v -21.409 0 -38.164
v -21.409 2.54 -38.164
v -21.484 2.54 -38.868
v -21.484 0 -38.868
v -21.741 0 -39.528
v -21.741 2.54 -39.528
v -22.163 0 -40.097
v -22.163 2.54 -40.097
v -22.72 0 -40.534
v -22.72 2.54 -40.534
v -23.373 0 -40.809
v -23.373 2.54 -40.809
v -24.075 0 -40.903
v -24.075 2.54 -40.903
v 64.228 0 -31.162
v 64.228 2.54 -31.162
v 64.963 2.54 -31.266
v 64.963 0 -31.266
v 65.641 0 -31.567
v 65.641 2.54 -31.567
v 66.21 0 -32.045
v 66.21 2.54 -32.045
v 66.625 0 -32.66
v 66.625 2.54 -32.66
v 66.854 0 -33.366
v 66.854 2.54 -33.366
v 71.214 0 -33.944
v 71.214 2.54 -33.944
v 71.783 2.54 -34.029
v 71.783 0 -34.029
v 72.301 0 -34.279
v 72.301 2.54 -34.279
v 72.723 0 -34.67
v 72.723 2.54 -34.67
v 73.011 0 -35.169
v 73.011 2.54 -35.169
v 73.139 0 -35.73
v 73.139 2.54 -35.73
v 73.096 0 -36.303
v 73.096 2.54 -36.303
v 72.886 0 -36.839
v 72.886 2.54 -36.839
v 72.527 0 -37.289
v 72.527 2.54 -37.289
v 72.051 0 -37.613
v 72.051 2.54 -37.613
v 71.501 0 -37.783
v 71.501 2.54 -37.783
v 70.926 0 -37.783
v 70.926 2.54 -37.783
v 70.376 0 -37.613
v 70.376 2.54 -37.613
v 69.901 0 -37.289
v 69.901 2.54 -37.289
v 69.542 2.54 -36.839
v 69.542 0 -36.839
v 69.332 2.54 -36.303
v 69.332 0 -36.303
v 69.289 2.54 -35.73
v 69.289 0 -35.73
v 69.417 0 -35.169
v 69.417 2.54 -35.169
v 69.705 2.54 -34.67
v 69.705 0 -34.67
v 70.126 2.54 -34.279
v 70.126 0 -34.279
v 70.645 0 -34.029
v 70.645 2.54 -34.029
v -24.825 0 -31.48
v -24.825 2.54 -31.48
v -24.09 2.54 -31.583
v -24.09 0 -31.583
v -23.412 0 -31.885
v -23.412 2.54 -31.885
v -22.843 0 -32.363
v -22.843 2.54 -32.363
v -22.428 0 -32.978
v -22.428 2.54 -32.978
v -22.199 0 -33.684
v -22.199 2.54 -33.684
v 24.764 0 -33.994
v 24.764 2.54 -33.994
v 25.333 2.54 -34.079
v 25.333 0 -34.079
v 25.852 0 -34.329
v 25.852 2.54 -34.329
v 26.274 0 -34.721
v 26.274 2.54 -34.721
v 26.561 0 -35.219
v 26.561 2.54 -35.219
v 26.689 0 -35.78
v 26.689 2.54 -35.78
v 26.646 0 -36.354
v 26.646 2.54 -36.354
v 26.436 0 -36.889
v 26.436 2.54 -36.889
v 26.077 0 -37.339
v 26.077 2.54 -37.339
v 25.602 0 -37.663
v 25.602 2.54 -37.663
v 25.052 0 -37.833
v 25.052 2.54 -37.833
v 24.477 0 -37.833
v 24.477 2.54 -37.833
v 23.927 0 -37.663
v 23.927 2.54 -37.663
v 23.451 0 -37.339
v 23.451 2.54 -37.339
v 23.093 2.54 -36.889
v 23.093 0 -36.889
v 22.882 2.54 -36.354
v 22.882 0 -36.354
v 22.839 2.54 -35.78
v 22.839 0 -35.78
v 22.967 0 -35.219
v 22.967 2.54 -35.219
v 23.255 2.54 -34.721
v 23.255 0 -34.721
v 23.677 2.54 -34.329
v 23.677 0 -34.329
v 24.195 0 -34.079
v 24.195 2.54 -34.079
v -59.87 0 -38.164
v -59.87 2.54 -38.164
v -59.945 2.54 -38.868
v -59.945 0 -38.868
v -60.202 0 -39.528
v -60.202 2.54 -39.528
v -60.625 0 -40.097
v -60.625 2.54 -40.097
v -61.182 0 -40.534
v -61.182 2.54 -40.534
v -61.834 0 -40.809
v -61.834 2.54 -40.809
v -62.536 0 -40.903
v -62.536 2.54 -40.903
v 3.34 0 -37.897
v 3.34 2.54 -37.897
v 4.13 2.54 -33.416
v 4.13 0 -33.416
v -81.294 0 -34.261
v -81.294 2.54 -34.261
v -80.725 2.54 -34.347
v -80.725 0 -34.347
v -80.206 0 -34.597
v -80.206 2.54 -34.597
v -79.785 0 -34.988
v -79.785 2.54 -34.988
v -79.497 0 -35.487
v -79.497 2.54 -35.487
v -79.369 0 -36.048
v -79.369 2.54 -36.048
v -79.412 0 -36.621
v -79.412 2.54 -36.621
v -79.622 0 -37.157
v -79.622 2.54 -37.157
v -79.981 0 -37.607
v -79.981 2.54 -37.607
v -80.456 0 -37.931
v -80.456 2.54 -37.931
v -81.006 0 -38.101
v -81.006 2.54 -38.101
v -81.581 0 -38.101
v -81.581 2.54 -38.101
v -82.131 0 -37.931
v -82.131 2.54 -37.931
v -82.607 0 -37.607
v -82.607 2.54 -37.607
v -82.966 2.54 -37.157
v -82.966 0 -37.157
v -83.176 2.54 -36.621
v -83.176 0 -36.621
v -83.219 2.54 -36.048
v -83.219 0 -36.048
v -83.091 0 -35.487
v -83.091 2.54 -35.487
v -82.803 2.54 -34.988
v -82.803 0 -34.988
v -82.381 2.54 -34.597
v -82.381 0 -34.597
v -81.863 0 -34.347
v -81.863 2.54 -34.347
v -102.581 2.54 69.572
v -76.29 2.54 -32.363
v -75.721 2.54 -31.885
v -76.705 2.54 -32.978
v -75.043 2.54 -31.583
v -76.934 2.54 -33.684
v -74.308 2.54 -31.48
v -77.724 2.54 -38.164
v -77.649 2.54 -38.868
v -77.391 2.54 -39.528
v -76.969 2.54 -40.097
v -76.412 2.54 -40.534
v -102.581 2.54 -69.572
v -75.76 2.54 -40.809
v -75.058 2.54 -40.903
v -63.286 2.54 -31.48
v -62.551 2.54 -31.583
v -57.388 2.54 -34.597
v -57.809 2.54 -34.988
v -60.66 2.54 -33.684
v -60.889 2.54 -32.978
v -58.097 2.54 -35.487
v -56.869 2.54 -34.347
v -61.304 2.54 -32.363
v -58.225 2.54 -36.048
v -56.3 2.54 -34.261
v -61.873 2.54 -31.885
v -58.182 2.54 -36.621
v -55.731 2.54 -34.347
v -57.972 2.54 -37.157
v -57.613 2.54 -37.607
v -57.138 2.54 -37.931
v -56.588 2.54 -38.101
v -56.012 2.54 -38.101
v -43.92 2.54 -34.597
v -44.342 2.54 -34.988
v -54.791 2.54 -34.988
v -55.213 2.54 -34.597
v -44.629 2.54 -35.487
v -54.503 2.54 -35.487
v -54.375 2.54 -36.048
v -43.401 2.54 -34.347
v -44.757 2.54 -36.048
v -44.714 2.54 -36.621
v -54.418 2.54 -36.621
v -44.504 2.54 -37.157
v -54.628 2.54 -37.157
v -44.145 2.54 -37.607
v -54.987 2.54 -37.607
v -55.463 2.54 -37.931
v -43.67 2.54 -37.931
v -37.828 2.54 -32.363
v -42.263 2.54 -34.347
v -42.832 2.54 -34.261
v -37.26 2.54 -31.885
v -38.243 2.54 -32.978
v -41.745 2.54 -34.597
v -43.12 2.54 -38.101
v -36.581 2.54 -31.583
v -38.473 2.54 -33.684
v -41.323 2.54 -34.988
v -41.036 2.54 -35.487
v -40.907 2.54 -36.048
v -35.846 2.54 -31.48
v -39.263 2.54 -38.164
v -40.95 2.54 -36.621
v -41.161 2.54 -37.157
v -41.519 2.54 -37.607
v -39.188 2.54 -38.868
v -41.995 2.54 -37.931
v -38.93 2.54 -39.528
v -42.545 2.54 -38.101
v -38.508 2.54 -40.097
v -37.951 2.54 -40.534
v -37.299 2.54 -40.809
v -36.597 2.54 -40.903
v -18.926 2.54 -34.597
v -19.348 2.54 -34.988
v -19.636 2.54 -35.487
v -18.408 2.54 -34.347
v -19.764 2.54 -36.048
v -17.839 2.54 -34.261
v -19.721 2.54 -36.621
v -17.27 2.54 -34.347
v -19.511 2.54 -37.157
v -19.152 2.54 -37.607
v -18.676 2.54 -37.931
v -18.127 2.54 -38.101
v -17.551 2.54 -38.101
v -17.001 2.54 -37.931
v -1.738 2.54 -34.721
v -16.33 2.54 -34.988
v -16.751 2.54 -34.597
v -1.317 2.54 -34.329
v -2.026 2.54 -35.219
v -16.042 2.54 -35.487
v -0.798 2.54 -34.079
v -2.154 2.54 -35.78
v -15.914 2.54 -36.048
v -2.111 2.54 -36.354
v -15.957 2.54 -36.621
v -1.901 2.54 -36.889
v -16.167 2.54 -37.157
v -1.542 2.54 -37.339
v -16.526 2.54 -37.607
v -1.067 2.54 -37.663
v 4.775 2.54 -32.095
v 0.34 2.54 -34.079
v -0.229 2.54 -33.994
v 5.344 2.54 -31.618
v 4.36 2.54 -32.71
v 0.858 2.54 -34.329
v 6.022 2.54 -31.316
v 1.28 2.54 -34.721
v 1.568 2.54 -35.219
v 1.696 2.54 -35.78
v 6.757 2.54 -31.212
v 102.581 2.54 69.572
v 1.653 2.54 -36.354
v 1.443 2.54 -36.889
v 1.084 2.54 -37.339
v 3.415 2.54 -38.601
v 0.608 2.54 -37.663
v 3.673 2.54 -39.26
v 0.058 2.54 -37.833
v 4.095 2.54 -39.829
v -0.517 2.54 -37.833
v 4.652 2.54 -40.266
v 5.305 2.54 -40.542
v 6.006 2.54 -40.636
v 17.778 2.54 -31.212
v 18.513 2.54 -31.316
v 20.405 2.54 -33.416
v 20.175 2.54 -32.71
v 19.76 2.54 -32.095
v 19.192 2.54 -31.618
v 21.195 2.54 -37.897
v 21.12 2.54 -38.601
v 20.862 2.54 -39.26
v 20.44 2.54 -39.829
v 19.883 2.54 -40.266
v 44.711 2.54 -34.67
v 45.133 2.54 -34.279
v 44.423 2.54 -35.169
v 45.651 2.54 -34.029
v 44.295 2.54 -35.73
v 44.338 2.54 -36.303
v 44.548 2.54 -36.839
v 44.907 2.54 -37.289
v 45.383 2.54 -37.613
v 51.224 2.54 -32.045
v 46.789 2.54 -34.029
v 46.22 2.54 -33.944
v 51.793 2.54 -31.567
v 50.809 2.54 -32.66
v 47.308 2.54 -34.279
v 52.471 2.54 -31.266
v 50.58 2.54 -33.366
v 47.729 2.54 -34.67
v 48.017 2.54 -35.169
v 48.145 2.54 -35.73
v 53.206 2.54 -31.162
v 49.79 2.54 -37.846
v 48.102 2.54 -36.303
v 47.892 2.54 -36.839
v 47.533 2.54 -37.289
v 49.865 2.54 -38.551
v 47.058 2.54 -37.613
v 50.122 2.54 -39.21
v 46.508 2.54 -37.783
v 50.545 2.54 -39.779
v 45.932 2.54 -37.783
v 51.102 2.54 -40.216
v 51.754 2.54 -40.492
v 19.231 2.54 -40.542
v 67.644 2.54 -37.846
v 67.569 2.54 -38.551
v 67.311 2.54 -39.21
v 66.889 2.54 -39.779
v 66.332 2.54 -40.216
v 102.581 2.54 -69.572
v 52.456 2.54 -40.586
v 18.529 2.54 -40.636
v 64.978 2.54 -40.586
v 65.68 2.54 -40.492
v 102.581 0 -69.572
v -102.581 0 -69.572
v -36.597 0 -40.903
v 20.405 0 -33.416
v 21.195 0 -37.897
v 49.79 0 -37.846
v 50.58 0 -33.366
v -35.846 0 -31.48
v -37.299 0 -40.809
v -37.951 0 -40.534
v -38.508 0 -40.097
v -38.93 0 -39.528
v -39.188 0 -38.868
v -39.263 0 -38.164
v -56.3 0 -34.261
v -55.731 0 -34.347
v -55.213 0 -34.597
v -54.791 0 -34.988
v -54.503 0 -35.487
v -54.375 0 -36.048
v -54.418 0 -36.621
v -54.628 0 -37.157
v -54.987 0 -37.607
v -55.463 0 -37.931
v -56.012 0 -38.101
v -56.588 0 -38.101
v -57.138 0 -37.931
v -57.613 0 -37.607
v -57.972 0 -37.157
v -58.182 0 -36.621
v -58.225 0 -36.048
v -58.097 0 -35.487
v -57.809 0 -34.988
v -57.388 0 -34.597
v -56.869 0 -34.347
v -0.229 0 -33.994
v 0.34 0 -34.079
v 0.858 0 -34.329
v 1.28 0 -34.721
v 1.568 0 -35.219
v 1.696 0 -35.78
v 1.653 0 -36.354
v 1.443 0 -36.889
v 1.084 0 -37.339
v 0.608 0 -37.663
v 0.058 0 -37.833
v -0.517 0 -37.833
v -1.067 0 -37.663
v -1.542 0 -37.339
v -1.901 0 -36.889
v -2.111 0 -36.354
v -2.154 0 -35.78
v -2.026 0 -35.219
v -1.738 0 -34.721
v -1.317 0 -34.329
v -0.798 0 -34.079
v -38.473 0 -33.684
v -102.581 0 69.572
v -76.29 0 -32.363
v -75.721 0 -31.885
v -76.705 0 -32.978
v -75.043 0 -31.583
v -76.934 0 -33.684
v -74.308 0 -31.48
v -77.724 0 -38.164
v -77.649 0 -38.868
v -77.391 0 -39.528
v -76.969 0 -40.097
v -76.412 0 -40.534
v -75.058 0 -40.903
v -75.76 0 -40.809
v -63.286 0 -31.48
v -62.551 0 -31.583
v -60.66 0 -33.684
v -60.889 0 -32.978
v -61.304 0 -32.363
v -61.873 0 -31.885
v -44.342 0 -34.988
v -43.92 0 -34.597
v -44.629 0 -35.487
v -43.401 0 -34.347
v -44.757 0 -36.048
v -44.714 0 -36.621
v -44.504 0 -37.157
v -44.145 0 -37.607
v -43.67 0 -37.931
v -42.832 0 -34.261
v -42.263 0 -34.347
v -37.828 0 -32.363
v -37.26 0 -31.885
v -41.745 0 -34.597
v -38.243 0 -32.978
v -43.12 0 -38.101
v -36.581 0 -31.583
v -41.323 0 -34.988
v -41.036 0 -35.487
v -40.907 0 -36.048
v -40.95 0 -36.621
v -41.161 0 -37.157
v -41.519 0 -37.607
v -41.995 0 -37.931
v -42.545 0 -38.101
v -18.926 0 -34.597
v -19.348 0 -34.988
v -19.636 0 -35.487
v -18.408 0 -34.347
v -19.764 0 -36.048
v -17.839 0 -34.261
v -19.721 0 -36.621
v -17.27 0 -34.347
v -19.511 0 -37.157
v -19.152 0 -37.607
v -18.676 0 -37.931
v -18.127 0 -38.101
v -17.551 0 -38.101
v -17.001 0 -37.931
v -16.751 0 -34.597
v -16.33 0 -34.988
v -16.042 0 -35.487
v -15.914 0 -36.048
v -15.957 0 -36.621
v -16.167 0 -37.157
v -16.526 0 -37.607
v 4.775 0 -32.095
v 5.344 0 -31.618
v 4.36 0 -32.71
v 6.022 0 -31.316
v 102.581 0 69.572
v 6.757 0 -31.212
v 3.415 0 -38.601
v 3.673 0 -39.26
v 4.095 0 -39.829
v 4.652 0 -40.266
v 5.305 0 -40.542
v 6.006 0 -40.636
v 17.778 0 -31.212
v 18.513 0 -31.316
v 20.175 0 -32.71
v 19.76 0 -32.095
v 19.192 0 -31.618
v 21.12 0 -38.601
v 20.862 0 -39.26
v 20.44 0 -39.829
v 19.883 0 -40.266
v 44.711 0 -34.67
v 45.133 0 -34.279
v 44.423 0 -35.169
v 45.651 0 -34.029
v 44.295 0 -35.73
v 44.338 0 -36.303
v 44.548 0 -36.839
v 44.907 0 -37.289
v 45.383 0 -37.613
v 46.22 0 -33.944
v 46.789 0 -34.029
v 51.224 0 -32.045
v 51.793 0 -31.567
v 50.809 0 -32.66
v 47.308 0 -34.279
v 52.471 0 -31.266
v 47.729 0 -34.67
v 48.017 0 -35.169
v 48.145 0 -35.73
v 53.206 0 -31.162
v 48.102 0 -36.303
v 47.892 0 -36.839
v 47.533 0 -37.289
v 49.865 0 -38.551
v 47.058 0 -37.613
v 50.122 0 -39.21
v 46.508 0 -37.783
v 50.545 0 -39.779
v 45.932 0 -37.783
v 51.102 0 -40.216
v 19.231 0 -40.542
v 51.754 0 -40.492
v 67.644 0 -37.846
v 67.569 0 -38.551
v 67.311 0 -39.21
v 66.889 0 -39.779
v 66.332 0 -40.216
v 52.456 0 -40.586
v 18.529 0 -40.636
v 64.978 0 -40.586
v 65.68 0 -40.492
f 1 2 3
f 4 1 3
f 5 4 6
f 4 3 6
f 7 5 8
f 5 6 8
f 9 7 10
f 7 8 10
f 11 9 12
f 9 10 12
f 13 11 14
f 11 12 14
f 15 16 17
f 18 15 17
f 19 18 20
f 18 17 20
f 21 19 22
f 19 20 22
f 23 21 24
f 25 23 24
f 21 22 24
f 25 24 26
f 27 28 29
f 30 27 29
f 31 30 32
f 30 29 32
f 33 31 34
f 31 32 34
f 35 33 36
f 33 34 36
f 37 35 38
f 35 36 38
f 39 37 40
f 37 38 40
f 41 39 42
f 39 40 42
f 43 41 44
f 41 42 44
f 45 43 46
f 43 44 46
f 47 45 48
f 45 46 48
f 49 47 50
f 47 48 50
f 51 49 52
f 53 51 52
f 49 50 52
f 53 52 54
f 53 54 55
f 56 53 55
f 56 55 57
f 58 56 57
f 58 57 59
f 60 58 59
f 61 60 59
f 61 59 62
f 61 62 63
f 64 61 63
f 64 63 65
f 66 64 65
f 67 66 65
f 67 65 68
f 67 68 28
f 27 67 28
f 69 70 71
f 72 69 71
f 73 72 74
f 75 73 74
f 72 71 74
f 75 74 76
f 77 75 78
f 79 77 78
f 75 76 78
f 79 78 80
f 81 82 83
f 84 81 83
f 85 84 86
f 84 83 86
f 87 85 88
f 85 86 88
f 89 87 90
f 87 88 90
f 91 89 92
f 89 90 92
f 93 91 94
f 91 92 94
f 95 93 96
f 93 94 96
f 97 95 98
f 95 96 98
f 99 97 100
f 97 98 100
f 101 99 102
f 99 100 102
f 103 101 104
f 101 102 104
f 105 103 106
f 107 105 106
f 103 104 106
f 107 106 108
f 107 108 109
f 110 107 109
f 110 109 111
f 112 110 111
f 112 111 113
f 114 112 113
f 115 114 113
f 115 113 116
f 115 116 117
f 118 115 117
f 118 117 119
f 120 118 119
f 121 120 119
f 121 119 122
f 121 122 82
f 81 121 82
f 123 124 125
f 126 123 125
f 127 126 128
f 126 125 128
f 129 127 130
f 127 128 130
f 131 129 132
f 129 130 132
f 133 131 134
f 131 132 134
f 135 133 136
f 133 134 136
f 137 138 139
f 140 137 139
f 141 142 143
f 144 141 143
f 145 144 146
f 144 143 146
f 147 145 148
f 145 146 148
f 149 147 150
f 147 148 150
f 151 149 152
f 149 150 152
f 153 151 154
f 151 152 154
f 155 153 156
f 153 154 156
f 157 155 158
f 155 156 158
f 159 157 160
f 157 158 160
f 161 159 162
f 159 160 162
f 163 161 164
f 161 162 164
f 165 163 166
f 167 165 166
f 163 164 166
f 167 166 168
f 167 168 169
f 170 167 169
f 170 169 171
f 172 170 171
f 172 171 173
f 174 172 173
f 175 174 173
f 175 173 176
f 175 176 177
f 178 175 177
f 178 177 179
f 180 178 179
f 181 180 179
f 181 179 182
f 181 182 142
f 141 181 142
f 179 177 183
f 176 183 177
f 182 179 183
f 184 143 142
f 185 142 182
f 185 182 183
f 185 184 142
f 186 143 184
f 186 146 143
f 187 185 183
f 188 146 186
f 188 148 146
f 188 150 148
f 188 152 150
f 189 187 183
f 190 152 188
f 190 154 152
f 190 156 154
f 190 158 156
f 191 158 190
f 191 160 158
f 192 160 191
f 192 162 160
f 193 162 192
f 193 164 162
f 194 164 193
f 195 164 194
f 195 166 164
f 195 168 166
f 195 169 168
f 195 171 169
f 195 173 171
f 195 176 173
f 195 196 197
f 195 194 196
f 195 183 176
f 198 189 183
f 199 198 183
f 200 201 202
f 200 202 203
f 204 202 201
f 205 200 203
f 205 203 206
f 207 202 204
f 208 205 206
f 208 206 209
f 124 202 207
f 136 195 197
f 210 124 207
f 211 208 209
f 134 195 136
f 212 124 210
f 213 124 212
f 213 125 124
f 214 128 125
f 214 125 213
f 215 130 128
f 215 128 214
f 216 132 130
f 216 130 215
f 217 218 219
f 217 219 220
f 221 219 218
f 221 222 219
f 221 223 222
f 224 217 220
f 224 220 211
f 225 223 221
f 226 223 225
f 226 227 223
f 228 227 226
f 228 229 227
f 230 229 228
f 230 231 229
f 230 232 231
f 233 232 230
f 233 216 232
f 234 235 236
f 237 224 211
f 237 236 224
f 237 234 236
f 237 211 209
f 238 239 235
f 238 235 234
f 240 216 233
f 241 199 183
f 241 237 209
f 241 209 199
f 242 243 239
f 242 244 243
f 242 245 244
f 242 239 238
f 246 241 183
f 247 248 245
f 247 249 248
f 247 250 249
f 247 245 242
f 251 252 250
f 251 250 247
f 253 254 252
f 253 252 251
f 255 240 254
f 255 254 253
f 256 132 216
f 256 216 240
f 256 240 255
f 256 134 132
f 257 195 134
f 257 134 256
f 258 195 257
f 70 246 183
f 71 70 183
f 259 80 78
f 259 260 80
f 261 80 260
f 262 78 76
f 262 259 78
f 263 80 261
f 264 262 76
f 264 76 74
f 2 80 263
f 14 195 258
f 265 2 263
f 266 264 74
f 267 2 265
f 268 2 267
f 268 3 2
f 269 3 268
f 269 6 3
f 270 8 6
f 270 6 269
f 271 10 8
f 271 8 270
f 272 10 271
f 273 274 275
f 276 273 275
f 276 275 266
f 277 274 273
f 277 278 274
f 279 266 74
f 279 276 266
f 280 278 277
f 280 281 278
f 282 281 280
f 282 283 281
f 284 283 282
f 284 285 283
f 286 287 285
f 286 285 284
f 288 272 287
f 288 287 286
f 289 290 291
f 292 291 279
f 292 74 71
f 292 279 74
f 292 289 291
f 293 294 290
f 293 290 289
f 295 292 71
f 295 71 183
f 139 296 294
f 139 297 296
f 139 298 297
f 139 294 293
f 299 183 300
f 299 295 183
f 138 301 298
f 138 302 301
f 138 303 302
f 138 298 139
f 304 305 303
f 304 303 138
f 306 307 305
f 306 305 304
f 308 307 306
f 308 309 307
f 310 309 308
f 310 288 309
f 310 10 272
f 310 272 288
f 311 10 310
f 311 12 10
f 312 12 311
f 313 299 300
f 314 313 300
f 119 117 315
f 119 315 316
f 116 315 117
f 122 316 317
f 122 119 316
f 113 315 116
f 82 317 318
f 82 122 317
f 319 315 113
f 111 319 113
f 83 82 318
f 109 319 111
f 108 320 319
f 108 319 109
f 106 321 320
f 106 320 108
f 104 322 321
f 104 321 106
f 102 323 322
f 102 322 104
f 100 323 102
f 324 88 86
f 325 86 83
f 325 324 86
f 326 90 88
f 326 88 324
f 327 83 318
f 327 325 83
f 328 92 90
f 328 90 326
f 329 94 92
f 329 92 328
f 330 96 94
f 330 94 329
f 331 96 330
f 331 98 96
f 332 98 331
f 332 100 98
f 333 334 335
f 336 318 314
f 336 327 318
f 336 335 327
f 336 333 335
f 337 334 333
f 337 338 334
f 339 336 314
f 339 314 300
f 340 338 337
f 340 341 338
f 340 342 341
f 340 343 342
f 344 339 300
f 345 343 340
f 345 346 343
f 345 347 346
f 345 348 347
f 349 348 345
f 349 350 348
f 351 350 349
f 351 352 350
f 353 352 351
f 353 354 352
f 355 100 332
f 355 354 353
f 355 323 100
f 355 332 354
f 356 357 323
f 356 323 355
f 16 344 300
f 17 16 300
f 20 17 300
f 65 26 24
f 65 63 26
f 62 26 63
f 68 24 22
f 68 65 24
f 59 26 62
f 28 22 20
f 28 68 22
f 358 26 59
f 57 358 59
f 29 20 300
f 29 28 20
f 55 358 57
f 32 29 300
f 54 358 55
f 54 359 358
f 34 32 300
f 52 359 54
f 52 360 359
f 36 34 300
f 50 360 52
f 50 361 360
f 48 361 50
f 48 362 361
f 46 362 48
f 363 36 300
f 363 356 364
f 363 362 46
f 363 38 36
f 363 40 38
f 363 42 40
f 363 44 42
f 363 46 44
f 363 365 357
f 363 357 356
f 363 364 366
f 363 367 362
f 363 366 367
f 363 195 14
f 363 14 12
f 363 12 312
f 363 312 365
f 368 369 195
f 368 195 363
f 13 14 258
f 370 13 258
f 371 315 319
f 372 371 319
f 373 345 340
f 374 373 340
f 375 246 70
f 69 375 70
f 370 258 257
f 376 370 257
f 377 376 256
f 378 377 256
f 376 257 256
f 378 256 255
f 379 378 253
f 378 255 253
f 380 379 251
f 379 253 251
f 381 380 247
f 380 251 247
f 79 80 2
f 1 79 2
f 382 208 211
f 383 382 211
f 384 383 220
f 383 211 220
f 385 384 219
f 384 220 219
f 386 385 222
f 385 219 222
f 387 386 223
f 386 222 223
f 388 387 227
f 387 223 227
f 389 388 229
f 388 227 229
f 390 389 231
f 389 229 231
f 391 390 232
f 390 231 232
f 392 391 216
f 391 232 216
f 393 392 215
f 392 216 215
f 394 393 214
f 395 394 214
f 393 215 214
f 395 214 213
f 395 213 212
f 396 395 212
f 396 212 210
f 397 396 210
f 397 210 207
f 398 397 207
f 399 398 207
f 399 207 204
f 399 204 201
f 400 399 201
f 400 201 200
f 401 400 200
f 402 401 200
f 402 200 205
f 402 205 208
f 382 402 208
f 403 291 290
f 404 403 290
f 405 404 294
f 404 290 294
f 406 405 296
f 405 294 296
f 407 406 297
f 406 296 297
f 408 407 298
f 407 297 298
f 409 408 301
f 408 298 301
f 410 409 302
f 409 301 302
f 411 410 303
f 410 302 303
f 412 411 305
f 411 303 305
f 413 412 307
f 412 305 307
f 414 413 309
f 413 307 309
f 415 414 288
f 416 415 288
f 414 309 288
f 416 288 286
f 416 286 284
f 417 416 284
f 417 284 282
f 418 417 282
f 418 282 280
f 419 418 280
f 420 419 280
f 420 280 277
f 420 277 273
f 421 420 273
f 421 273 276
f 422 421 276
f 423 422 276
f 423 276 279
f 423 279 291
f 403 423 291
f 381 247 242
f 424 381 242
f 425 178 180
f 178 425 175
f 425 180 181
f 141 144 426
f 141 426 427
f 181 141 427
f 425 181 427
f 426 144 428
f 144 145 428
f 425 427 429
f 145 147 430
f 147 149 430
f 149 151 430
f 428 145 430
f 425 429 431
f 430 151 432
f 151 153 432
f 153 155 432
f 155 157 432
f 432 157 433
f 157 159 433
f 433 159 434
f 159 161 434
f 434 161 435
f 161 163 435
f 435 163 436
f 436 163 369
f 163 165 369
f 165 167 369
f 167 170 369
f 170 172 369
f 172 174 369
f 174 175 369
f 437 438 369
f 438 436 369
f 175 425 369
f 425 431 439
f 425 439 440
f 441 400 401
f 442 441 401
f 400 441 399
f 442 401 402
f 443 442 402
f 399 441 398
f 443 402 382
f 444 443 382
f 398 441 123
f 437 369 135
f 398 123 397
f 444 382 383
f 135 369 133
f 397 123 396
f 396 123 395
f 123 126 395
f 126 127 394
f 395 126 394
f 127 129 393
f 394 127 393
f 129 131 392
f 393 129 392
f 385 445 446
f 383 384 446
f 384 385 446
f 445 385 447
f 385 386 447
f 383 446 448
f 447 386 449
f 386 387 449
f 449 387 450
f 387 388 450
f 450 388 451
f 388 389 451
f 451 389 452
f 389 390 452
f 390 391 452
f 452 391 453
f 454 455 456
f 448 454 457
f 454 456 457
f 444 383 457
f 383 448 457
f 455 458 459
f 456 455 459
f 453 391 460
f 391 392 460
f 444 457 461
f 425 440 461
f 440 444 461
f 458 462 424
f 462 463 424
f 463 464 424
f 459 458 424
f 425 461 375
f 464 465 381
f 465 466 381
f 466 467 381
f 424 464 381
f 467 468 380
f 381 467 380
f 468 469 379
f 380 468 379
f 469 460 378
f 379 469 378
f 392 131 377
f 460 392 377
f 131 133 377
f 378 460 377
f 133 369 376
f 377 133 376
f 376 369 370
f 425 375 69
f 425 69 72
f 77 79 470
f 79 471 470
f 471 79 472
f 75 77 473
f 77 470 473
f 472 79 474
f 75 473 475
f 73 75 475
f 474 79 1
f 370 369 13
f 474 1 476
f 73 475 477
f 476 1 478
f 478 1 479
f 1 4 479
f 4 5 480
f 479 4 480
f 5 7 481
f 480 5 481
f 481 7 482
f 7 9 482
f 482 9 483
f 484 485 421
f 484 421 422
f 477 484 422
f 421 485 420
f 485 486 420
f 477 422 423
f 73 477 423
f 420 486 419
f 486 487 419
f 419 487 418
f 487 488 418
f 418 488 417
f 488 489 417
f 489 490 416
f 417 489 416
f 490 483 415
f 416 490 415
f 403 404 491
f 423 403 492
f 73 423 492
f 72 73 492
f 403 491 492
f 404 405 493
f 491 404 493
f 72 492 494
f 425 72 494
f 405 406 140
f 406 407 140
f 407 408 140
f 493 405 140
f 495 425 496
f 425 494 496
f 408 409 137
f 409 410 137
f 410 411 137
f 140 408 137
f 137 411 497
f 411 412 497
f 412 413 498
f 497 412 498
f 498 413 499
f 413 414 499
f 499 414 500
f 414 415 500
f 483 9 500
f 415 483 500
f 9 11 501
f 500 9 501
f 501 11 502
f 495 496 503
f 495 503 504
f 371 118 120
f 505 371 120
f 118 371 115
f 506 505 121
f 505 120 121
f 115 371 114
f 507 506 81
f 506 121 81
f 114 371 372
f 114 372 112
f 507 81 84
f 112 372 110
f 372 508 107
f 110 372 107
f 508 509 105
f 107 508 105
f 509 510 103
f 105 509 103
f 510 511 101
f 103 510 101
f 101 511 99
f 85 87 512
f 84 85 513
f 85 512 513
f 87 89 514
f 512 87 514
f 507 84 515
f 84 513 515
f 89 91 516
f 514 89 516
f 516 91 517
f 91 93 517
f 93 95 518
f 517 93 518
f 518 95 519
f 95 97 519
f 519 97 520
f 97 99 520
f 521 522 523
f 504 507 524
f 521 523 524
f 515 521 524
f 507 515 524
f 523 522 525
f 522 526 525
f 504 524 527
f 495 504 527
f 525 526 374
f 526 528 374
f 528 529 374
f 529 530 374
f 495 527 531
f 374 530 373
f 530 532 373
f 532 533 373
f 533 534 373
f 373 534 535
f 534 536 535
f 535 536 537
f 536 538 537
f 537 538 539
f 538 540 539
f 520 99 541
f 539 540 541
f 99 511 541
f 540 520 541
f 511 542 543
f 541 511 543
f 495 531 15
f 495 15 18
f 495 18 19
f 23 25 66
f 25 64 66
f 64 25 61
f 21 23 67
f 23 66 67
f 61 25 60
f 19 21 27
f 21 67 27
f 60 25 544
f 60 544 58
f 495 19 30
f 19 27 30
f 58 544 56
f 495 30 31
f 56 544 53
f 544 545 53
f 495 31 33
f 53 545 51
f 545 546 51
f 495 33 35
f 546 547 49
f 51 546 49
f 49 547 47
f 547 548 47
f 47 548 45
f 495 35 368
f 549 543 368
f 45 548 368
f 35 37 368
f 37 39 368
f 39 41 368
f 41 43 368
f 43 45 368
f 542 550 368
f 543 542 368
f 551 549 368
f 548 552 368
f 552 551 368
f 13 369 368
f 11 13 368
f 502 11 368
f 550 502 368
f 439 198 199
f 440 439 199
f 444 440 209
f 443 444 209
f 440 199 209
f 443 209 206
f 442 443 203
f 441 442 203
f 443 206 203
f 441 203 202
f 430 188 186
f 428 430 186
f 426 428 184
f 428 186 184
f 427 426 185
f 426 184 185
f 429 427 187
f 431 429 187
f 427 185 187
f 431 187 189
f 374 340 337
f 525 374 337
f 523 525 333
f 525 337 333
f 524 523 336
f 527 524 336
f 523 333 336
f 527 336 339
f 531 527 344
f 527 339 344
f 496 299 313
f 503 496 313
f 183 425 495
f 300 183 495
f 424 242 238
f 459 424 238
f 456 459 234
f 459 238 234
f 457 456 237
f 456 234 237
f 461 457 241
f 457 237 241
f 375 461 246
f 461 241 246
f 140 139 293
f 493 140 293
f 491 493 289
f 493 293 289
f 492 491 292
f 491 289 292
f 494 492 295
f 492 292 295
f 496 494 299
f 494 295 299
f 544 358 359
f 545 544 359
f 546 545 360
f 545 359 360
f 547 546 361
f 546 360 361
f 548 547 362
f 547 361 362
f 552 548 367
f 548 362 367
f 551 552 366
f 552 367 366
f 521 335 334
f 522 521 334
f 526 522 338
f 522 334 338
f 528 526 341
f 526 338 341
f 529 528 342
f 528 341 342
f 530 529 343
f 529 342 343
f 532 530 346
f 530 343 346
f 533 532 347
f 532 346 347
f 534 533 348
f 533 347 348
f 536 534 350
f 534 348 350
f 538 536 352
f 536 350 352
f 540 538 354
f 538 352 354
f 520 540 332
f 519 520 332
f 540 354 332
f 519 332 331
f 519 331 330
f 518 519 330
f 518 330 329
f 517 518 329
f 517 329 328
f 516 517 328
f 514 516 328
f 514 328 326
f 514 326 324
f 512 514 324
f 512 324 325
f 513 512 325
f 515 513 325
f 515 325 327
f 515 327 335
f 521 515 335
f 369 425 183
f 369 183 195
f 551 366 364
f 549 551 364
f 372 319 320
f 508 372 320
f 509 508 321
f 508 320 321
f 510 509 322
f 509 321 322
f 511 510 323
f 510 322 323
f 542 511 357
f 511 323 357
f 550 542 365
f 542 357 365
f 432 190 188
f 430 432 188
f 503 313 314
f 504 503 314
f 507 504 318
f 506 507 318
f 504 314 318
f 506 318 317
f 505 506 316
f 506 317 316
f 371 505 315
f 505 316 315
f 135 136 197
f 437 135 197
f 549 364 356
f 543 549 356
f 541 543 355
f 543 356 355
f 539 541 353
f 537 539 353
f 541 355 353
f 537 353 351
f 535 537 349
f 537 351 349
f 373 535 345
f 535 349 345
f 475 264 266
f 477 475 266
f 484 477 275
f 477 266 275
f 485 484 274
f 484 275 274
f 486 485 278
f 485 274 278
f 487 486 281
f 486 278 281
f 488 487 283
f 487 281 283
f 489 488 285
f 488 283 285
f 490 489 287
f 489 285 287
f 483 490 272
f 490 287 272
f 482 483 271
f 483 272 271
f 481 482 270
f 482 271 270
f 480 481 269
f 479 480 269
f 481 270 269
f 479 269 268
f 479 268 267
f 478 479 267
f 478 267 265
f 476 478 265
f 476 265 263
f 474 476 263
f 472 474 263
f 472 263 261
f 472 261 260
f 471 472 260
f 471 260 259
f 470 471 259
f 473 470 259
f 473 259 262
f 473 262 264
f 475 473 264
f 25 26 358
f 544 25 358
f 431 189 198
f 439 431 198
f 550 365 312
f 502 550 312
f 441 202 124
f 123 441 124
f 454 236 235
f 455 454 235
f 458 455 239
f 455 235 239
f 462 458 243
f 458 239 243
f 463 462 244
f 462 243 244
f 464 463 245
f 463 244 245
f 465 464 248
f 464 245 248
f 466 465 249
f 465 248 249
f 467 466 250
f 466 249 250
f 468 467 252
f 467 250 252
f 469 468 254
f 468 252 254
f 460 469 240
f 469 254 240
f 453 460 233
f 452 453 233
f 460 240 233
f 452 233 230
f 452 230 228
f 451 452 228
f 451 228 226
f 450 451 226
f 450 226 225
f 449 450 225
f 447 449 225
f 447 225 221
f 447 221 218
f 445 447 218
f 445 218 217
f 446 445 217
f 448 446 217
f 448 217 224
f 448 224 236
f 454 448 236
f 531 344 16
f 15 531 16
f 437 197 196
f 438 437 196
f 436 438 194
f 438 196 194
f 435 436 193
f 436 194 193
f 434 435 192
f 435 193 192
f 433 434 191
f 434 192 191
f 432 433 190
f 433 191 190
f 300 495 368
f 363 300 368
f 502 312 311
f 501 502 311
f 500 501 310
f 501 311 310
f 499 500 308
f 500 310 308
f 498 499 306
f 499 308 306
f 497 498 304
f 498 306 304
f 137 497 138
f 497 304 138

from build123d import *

# Parameters (mm, degrees)
SKETCH1_W           = 205.16159644
SKETCH1_H           = 139.144251052
BOSS_EXTRUDE1_DEPTH = 2.54
SKETCH3_R           = 1.9304
CUT_EXTRUDE1_DEPTH  = 124.973998942


with BuildPart() as part:
    # Sketch1 → Boss-Extrude1 (new body)
    with BuildSketch(Plane(origin=(0, 0, 0), x_dir=(1, 0, 0), z_dir=(0, 1, 0))):
        Rectangle(SKETCH1_W, SKETCH1_H)
    extrude(amount=BOSS_EXTRUDE1_DEPTH)

    # Sketch3 → Cut-Extrude1 (cut, through all)
    with BuildSketch(Plane(origin=(0, 2.54, 0), x_dir=(1, 0, 0), z_dir=(0, 1, 0))):
        with Locations(Location((-81.293768085, 36.19177457, 0), (0, 0, 270))):
            Circle(SKETCH3_R)
        with Locations(Location((-56.300168085, 36.19177457, 0), (0, 0, 270))):
            Circle(SKETCH3_R)
        with Locations(Location((-42.832492591, 36.19177457, 0), (0, 0, 270))):
            Circle(SKETCH3_R)
        with Locations(Location((-17.838892591, 36.19177457, 0), (0, 0, 270))):
            Circle(SKETCH3_R)
        with Locations(Location((-0.229233582, 35.924108913, 0), (0, 0, 270))):
            Circle(SKETCH3_R)
        with Locations(Location((24.764366418, 35.924108913, 0), (0, 0, 270))):
            Circle(SKETCH3_R)
        with Locations(Location((46.220152976, 35.873923159, 0), (0, 0, 270))):
            Circle(SKETCH3_R)
        with Locations(Location((71.213752976, 35.873923159, 0), (0, 0, 270))):
            Circle(SKETCH3_R)
        with BuildLine():
            Line((-62.535868085, 40.90347457), (-75.058068085, 40.90347457))
            ThreePointArc((-75.058068085, 40.90347457), (-76.969282019, 40.096622494), (-77.724090306, 38.164262946))
            Line((-77.724090306, 38.164262946), (-76.934091112, 33.68395488))
            ThreePointArc((-76.934091112, 33.68395488), (-76.02192339, 32.10403404), (-74.307608835, 31.48007457))
            Line((-74.307608835, 31.48007457), (-63.286327336, 31.48007457))
            ThreePointArc((-63.286327336, 31.48007457), (-61.572012781, 32.10403404), (-60.659845059, 33.68395488))
            Line((-60.659845059, 33.68395488), (-59.869845865, 38.164262946))
            ThreePointArc((-59.869845865, 38.164262946), (-60.624654152, 40.096622494), (-62.535868085, 40.90347457))
        make_face()
        with BuildLine():
            Line((-24.074592591, 40.90347457), (-36.596792591, 40.90347457))
            ThreePointArc((-36.596792591, 40.90347457), (-38.508006525, 40.096622494), (-39.262814812, 38.164262946))
            Line((-39.262814812, 38.164262946), (-38.472815618, 33.68395488))
            ThreePointArc((-38.472815618, 33.68395488), (-37.560647896, 32.10403404), (-35.846333341, 31.48007457))
            Line((-35.846333341, 31.48007457), (-24.825051842, 31.48007457))
            ThreePointArc((-24.825051842, 31.48007457), (-23.110737287, 32.10403404), (-22.198569565, 33.68395488))
            Line((-22.198569565, 33.68395488), (-21.408570371, 38.164262946))
            ThreePointArc((-21.408570371, 38.164262946), (-22.163378658, 40.096622494), (-24.074592591, 40.90347457))
        make_face()
        with BuildLine():
            Line((18.528666418, 40.635808913), (6.006466418, 40.635808913))
            ThreePointArc((6.006466418, 40.635808913), (4.095252484, 39.828956838), (3.340444197, 37.89659729))
            Line((3.340444197, 37.89659729), (4.130443391, 33.416289223))
            ThreePointArc((4.130443391, 33.416289223), (5.042611113, 31.836368383), (6.756925668, 31.212408913))
            Line((6.756925668, 31.212408913), (17.778207167, 31.212408913))
            ThreePointArc((17.778207167, 31.212408913), (19.492521722, 31.836368383), (20.404689444, 33.416289223))
            Line((20.404689444, 33.416289223), (21.194688638, 37.89659729))
            ThreePointArc((21.194688638, 37.89659729), (20.439880351, 39.828956838), (18.528666418, 40.635808913))
        make_face()
        with BuildLine():
            Line((64.978052976, 40.585623159), (52.455852976, 40.585623159))
            ThreePointArc((52.455852976, 40.585623159), (50.544639042, 39.778771083), (49.789830755, 37.846411536))
            Line((49.789830755, 37.846411536), (50.579829949, 33.366103469))
            ThreePointArc((50.579829949, 33.366103469), (51.491997671, 31.786182629), (53.206312227, 31.162223159))
            Line((53.206312227, 31.162223159), (64.227593725, 31.162223159))
            ThreePointArc((64.227593725, 31.162223159), (65.94190828, 31.786182629), (66.854076003, 33.366103469))
            Line((66.854076003, 33.366103469), (67.644075197, 37.846411536))
            ThreePointArc((67.644075197, 37.846411536), (66.88926691, 39.778771083), (64.978052976, 40.585623159))
        make_face()
    extrude(amount=-CUT_EXTRUDE1_DEPTH, mode=Mode.SUBTRACT)


solid = part.part
